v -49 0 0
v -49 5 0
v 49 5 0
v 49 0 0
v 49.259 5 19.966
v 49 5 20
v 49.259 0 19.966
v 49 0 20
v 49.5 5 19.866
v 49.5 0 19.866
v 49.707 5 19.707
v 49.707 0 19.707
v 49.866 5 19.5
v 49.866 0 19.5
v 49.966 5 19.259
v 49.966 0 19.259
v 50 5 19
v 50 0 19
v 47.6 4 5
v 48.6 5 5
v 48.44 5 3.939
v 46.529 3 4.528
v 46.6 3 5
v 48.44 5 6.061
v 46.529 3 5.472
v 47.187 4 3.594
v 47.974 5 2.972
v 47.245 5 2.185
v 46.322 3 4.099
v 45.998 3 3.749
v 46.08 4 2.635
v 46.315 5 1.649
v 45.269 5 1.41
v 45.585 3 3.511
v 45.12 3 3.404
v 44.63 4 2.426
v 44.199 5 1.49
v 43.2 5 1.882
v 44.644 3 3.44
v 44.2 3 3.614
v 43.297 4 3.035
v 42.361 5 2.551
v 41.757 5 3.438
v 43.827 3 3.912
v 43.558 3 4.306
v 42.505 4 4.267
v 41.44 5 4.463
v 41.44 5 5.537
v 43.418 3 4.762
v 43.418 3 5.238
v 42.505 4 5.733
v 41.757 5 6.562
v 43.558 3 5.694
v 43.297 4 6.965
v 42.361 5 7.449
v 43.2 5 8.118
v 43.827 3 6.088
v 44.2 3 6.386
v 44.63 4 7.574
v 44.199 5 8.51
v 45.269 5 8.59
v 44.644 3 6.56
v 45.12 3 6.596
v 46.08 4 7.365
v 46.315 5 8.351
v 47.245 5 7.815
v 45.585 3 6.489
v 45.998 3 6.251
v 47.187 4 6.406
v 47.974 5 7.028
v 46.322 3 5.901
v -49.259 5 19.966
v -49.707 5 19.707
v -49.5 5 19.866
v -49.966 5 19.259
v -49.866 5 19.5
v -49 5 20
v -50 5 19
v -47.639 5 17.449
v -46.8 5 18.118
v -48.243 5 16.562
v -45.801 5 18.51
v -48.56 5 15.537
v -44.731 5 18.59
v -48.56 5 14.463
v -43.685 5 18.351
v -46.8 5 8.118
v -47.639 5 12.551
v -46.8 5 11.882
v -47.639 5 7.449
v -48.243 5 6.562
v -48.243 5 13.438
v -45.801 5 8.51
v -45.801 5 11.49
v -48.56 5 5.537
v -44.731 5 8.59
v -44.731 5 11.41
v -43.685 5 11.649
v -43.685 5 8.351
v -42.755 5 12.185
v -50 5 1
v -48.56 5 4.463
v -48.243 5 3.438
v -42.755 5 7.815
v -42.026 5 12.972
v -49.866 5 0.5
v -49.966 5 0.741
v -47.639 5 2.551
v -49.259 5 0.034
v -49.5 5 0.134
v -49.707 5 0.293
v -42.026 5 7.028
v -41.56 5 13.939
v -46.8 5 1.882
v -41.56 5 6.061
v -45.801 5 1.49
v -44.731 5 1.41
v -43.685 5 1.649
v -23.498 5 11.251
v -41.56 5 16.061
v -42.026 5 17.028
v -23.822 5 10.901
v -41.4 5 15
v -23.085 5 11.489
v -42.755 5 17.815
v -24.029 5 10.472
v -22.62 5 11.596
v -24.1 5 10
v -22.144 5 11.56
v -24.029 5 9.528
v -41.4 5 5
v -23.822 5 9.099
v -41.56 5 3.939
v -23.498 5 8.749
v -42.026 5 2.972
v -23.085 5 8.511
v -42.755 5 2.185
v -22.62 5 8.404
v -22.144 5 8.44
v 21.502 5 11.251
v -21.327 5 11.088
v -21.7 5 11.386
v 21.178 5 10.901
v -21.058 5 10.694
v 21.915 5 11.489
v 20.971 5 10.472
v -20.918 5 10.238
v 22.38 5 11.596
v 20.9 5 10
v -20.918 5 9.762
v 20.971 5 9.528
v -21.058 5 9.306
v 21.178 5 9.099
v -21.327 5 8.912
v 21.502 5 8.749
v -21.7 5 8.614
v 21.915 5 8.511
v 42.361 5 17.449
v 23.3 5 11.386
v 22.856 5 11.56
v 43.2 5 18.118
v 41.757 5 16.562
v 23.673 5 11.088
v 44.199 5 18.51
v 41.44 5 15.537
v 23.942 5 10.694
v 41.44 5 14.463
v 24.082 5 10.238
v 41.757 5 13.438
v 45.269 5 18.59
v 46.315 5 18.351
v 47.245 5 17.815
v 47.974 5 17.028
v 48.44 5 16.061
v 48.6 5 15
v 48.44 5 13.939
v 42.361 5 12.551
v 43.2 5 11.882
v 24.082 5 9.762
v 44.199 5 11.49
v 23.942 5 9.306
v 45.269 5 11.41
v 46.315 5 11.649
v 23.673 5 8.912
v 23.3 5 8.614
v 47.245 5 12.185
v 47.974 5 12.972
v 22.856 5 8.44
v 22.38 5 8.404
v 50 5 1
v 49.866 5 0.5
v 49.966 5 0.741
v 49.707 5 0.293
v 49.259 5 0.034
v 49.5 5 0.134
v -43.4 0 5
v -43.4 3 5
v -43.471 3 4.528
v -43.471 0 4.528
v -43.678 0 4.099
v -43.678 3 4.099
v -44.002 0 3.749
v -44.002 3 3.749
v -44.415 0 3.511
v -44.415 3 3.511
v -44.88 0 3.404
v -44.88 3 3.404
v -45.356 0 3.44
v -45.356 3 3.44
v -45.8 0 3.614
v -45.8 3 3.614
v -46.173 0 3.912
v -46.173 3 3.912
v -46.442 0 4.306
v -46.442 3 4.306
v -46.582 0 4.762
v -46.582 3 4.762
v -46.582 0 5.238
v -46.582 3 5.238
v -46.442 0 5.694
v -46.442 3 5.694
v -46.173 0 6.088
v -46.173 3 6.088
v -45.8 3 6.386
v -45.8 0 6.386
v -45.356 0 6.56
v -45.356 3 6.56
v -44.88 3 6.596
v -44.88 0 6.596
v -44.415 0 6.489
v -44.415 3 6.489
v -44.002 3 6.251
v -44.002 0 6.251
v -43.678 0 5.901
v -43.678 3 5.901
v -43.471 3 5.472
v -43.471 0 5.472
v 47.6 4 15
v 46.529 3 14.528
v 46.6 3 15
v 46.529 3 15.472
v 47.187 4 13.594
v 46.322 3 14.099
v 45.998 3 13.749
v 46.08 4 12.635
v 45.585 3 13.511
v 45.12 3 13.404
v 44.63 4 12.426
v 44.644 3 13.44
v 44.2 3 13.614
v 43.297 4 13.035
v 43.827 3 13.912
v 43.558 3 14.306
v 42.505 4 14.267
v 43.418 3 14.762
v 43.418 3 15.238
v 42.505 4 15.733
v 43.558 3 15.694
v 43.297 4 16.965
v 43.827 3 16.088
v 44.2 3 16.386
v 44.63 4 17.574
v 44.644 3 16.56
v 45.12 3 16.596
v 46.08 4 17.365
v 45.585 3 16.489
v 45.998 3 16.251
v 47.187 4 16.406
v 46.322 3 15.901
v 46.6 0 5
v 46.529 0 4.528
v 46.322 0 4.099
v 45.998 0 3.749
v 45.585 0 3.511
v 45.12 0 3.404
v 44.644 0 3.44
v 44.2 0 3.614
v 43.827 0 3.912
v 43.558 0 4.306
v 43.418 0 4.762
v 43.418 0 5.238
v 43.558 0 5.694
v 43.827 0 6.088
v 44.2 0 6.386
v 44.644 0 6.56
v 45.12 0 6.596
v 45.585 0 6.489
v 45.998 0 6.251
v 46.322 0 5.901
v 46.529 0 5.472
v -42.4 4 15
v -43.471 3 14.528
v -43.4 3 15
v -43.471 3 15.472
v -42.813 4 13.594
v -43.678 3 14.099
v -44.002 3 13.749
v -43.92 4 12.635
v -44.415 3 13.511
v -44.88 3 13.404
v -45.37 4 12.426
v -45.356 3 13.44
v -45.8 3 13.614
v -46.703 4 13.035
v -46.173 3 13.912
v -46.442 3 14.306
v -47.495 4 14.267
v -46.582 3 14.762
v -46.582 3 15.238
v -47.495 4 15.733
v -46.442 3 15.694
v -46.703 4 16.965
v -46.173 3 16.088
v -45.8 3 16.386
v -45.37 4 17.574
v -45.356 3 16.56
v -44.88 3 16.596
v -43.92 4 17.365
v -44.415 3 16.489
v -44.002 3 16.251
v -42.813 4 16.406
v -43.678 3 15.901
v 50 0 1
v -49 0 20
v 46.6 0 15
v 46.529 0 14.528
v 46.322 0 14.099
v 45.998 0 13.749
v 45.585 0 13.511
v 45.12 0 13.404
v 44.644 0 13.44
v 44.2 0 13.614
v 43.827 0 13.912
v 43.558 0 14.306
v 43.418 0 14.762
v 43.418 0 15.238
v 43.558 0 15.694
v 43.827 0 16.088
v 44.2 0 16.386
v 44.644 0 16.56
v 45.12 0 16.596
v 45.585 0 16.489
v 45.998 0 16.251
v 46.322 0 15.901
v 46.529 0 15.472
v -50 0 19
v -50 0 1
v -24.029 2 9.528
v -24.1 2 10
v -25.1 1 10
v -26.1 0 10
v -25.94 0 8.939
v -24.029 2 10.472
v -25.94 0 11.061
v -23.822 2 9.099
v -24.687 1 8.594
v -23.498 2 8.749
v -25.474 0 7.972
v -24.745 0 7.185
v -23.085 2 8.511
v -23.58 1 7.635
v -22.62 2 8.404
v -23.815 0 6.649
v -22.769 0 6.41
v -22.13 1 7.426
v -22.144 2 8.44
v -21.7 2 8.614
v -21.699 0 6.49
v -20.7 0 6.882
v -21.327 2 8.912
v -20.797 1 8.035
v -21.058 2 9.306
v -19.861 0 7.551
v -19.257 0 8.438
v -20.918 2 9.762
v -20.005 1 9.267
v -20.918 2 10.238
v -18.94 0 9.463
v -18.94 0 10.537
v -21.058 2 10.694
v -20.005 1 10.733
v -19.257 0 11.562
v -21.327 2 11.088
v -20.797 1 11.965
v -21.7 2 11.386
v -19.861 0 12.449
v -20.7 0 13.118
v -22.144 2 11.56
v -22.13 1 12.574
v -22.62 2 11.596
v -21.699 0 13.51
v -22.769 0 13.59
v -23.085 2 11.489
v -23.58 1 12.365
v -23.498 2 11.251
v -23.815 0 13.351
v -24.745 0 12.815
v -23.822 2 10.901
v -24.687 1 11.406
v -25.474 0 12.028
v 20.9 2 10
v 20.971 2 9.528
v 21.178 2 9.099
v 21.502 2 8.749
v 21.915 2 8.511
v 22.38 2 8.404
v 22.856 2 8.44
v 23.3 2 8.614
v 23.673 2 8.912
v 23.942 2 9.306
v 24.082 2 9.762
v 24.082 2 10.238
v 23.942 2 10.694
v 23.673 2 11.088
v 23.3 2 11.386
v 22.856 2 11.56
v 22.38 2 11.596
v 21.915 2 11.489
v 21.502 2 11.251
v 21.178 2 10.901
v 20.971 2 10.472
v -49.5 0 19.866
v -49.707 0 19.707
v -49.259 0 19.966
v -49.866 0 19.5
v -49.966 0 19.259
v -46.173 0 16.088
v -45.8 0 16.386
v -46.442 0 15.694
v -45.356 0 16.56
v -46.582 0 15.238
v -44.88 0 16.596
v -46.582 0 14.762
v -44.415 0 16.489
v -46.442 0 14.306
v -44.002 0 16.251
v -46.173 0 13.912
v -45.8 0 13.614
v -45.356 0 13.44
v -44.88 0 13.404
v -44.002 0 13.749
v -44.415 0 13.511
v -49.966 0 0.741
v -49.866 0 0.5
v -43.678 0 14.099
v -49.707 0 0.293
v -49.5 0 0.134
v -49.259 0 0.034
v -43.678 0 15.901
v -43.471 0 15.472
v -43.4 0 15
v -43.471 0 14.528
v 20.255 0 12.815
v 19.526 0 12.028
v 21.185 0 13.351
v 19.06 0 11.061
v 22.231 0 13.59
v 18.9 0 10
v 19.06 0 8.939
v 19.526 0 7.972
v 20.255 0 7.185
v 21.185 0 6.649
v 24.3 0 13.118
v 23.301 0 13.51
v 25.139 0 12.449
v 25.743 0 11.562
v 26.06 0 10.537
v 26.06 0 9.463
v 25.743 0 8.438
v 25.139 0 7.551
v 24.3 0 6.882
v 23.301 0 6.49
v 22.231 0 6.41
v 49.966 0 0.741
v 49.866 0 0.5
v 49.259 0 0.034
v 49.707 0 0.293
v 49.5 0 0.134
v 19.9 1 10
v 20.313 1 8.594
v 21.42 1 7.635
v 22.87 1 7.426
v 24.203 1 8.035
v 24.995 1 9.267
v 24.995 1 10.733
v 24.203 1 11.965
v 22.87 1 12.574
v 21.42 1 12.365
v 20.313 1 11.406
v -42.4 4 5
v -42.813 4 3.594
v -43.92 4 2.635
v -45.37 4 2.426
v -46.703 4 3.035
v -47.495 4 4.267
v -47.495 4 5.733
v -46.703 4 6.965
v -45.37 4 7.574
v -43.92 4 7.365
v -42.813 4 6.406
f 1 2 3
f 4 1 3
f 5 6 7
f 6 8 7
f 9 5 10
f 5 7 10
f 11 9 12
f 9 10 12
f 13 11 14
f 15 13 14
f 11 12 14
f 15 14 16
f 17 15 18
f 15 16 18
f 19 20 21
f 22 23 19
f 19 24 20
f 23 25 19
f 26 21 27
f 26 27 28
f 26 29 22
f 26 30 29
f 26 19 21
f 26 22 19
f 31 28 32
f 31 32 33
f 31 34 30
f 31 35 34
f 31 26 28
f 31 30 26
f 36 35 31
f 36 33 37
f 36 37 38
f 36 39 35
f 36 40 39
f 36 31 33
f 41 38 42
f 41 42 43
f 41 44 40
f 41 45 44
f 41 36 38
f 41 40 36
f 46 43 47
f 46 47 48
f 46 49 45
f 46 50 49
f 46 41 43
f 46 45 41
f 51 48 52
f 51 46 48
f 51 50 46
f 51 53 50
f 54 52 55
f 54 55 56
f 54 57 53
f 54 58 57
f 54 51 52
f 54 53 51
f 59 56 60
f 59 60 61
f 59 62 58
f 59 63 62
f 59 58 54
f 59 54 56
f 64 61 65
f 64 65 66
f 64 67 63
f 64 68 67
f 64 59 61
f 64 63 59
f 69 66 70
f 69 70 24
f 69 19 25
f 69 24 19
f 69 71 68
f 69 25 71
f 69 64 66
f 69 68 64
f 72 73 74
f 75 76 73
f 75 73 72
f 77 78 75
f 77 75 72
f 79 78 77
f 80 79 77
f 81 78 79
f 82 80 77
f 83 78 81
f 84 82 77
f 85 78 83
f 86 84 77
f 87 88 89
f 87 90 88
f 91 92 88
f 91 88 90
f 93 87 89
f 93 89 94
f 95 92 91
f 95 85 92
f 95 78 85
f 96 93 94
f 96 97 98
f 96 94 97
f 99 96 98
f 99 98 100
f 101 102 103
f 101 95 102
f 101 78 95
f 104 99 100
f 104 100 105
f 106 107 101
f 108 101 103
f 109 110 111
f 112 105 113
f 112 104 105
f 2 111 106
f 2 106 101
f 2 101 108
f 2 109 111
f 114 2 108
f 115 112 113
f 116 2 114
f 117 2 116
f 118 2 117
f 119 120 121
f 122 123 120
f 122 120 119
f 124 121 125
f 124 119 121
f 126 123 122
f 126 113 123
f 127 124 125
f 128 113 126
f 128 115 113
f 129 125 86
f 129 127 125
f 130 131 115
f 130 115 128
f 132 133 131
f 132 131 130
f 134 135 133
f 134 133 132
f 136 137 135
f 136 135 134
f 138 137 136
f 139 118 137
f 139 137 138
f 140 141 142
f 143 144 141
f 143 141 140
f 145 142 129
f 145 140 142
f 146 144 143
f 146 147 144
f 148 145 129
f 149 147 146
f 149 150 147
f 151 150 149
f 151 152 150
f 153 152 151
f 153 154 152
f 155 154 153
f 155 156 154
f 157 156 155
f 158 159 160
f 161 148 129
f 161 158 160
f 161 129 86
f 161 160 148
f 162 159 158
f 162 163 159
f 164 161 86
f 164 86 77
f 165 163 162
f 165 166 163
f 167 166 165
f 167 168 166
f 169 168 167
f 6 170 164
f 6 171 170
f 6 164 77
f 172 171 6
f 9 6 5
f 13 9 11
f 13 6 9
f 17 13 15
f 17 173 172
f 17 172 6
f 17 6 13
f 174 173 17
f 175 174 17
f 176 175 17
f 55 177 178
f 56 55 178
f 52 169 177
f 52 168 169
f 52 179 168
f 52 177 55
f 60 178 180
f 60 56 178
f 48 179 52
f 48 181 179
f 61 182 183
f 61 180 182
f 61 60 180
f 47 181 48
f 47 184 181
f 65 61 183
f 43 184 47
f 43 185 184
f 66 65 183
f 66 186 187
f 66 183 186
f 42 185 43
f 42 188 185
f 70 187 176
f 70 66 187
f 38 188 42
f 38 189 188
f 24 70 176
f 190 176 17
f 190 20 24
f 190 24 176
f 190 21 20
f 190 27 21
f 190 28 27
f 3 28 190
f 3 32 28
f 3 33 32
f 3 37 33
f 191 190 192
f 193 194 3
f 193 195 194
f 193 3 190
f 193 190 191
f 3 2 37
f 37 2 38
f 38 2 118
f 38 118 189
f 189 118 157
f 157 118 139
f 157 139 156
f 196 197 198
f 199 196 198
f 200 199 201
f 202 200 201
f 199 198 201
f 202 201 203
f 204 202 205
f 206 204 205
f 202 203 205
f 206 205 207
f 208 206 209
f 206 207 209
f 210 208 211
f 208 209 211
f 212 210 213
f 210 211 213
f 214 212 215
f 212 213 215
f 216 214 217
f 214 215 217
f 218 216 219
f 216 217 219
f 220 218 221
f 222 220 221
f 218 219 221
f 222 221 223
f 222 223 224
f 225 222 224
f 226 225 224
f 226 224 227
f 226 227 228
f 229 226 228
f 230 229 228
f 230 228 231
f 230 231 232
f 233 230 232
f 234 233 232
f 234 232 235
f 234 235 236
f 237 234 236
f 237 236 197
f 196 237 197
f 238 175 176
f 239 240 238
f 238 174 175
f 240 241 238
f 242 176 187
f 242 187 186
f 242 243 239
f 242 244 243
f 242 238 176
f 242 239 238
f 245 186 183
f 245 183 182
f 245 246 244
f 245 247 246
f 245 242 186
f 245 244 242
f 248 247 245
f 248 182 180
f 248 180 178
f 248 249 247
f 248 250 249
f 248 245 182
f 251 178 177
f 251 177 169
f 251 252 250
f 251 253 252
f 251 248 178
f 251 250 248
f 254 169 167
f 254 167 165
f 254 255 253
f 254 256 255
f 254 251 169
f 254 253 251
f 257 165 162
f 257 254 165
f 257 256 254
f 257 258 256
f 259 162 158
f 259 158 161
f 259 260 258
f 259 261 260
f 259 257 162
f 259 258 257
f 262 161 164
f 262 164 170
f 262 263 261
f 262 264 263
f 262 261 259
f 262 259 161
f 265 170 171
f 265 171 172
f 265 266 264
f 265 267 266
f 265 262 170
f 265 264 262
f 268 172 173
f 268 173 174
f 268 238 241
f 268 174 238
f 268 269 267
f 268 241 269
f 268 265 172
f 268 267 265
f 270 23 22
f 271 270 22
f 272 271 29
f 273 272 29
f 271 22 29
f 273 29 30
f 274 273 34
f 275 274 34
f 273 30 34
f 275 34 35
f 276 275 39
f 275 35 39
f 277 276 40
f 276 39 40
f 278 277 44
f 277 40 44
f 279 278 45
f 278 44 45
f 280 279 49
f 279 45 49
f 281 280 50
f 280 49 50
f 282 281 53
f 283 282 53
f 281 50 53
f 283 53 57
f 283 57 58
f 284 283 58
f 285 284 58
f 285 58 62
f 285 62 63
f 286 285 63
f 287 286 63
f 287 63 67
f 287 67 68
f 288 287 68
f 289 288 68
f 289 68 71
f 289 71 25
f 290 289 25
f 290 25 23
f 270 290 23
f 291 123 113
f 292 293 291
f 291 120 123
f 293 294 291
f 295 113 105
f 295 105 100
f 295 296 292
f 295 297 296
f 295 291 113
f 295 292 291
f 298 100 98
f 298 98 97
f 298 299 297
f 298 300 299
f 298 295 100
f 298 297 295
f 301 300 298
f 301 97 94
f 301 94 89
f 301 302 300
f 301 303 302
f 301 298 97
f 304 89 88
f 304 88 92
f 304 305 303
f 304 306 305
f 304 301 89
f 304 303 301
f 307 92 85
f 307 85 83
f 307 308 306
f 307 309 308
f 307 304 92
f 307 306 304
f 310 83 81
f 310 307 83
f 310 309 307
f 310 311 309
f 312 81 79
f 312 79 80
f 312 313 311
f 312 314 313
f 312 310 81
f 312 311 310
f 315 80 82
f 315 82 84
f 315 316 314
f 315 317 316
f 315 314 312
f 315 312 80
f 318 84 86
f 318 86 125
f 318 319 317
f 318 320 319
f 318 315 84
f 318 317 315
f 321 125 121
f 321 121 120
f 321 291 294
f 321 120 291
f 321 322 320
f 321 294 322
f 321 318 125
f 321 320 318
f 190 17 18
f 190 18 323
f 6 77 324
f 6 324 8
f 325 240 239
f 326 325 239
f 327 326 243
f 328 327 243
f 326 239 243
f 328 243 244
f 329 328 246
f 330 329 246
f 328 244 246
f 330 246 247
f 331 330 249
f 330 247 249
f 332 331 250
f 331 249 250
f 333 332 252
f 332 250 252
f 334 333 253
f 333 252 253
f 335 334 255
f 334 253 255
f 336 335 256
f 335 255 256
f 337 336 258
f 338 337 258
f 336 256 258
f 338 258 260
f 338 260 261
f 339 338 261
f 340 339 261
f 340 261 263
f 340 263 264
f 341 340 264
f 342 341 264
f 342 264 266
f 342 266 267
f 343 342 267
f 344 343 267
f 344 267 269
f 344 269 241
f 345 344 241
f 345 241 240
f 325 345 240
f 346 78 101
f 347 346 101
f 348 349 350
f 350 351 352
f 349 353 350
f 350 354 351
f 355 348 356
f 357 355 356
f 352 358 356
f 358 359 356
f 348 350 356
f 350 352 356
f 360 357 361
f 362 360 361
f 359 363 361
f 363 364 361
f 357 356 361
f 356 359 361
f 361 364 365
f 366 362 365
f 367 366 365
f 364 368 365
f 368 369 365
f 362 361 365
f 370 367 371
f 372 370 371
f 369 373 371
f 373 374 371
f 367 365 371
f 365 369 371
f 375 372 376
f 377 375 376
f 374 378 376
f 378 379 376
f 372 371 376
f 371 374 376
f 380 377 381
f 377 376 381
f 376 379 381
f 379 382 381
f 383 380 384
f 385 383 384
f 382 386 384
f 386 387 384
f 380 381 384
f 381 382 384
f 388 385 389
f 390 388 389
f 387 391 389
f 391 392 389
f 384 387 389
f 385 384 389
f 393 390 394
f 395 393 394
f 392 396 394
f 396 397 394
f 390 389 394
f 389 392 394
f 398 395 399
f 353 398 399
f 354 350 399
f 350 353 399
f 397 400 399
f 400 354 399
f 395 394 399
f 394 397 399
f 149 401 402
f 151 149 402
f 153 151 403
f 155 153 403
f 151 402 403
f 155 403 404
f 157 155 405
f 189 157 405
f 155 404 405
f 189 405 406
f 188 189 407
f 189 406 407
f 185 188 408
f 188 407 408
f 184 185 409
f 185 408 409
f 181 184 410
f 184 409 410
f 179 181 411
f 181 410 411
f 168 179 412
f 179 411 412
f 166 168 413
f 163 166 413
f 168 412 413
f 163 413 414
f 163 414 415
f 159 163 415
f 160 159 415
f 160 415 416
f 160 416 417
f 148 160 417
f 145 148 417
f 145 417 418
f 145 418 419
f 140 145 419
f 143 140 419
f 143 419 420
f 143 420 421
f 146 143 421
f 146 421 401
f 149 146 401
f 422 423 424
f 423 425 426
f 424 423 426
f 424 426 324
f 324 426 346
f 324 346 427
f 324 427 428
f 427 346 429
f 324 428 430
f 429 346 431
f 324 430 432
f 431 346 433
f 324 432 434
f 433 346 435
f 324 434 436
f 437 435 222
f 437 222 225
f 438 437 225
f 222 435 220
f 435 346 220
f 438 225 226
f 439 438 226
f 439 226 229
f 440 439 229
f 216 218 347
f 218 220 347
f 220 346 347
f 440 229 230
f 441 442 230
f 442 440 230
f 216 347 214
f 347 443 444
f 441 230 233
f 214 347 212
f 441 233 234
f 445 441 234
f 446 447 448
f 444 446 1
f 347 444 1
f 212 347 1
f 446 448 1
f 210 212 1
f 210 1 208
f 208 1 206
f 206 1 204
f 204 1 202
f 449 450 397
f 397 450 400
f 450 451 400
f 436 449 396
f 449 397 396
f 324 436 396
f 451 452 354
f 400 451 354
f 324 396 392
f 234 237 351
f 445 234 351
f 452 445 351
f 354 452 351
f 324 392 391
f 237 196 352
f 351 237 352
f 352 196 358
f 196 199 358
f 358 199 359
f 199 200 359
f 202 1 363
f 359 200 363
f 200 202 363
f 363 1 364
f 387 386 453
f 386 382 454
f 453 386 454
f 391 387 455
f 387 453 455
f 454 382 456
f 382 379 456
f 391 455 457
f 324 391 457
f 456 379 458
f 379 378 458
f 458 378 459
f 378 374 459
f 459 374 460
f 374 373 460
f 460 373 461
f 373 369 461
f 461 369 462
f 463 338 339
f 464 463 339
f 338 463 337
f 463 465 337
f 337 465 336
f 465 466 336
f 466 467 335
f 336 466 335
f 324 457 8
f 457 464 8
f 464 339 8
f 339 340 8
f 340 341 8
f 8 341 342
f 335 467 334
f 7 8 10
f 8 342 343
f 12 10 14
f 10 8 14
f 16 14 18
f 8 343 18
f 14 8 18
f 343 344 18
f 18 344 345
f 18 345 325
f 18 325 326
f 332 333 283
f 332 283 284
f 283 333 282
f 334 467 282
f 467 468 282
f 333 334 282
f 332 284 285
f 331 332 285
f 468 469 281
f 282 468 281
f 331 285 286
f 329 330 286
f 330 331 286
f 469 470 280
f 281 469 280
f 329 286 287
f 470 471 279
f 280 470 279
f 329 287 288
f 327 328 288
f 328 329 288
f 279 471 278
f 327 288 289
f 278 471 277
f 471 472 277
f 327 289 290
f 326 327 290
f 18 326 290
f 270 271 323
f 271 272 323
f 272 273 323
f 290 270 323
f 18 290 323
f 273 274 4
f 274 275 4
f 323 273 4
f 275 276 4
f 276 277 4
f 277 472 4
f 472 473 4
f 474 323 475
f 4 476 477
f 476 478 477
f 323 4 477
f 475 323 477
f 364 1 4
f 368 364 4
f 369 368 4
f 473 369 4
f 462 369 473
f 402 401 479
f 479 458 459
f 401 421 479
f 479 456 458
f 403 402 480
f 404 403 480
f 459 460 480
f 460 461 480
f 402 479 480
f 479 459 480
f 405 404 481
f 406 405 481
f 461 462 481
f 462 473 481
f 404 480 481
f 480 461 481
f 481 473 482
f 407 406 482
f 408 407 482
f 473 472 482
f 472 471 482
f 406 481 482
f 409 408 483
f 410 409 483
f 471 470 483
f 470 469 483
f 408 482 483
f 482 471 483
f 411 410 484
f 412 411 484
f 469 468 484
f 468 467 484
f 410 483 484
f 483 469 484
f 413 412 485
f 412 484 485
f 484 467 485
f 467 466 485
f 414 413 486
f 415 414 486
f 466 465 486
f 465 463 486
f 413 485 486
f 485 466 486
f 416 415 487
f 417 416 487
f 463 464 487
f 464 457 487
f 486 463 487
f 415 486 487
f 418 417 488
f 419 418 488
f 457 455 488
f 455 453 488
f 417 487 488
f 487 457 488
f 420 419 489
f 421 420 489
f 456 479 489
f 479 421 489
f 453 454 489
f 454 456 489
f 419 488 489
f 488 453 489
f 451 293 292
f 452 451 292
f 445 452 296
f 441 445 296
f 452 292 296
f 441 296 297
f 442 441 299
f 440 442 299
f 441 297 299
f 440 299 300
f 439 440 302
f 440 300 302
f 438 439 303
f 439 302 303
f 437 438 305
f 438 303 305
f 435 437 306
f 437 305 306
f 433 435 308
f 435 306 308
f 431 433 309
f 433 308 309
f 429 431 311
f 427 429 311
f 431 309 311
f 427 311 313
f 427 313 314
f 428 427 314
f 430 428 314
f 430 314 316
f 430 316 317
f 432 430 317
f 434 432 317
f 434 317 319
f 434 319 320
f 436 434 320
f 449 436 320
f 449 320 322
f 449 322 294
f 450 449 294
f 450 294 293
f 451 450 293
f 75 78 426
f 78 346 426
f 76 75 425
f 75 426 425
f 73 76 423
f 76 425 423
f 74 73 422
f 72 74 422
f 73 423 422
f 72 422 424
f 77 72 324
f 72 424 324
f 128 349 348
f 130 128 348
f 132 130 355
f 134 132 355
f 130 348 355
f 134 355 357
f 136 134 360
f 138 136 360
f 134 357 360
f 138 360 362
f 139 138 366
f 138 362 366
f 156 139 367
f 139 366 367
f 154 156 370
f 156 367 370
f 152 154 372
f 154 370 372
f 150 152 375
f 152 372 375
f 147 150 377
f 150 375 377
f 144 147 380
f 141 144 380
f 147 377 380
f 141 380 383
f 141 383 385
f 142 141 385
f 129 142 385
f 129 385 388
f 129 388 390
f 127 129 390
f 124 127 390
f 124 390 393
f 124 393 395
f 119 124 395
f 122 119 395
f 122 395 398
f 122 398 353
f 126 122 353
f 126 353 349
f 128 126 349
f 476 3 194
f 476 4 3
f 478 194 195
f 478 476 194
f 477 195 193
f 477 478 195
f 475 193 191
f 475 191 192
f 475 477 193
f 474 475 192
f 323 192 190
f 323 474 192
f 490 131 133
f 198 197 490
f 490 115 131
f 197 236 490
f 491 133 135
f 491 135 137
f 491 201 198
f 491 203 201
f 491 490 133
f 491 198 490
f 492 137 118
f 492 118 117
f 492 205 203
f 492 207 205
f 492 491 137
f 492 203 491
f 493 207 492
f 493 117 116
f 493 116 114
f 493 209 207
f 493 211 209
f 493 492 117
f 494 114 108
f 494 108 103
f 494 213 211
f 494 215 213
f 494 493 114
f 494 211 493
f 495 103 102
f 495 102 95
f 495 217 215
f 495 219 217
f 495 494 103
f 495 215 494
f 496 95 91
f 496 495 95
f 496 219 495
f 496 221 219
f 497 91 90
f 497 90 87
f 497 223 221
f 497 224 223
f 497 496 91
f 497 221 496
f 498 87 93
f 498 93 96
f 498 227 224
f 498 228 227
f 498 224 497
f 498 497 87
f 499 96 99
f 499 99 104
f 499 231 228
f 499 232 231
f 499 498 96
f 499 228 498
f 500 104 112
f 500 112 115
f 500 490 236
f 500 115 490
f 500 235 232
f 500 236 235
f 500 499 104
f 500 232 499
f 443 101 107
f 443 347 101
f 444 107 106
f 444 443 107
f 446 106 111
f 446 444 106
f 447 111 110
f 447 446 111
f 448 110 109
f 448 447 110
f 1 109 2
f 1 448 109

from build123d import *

# Parameters (mm, degrees)
ESQUISSE1_W                     = 100
ESQUISSE1_H                     = 20
BOSS_EXTRU_1_DEPTH              = 5
DIAM_TRE_DU_PER_AGE_3_2_3_2_1_D = 3.2
DIAM_TRE_DU_PER_AGE_3_2_3_2_2_D = 3.2
CONG_1_R                        = 1
CHANFREIN1_SIZE                 = 2
CHANFREIN2_SIZE                 = 2


with BuildPart() as part:
    # Esquisse1 → Boss.-Extru.1 (new body)
    with BuildSketch(Plane(origin=(0, 5, 0), x_dir=(1, 0, 0), z_dir=(0, 1, 0))):
        with Locations((0, -10)):
            Rectangle(ESQUISSE1_W, ESQUISSE1_H)
    extrude(amount=-BOSS_EXTRU_1_DEPTH)

    # Diamètre du perçage Ø3.2 (3.2)1 (through all)
    with Locations(Plane(origin=(0, 5, 0), x_dir=(1, 0, 0), z_dir=(0, 1, 0))):
        with Locations((22.5, -10), (-22.5, -10)):
            Hole(DIAM_TRE_DU_PER_AGE_3_2_3_2_1_D / 2)

    # Diamètre du perçage Ø3.2 (3.2)2 (through all)
    with Locations(Plane(origin=(0, 0, 0), x_dir=(-1, 0, 0), z_dir=(0, -1, 0))):
        with Locations((45, -15), (45, -5), (-45, -5), (-45, -15)):
            Hole(DIAM_TRE_DU_PER_AGE_3_2_3_2_2_D / 2)

    # Congé1
    cong_1_edges = [part.edges().sort_by_distance(p)[0] for p in [
        (-50, 2.5, 20),
        (-50, 2.5, 0),
        (50, 2.5, 0),
        (50, 2.5, 20),
    ]]
    fillet(cong_1_edges, radius=CONG_1_R)

    # Chanfrein1
    chanfrein1_edges = [part.edges().sort_by_distance(p)[0] for p in [
        (43.4, 5, 15),
        (43.4, 5, 5),
        (-46.6, 5, 5),
        (-46.6, 5, 15),
    ]]
    chamfer(chanfrein1_edges, length=CHANFREIN1_SIZE)

    # Chanfrein2
    chanfrein2_edges = [part.edges().sort_by_distance(p)[0] for p in [
        (-20.9, 0, 10),
        (24.1, 0, 10),
    ]]
    chamfer(chanfrein2_edges, length=CHANFREIN2_SIZE)


solid = part.part
